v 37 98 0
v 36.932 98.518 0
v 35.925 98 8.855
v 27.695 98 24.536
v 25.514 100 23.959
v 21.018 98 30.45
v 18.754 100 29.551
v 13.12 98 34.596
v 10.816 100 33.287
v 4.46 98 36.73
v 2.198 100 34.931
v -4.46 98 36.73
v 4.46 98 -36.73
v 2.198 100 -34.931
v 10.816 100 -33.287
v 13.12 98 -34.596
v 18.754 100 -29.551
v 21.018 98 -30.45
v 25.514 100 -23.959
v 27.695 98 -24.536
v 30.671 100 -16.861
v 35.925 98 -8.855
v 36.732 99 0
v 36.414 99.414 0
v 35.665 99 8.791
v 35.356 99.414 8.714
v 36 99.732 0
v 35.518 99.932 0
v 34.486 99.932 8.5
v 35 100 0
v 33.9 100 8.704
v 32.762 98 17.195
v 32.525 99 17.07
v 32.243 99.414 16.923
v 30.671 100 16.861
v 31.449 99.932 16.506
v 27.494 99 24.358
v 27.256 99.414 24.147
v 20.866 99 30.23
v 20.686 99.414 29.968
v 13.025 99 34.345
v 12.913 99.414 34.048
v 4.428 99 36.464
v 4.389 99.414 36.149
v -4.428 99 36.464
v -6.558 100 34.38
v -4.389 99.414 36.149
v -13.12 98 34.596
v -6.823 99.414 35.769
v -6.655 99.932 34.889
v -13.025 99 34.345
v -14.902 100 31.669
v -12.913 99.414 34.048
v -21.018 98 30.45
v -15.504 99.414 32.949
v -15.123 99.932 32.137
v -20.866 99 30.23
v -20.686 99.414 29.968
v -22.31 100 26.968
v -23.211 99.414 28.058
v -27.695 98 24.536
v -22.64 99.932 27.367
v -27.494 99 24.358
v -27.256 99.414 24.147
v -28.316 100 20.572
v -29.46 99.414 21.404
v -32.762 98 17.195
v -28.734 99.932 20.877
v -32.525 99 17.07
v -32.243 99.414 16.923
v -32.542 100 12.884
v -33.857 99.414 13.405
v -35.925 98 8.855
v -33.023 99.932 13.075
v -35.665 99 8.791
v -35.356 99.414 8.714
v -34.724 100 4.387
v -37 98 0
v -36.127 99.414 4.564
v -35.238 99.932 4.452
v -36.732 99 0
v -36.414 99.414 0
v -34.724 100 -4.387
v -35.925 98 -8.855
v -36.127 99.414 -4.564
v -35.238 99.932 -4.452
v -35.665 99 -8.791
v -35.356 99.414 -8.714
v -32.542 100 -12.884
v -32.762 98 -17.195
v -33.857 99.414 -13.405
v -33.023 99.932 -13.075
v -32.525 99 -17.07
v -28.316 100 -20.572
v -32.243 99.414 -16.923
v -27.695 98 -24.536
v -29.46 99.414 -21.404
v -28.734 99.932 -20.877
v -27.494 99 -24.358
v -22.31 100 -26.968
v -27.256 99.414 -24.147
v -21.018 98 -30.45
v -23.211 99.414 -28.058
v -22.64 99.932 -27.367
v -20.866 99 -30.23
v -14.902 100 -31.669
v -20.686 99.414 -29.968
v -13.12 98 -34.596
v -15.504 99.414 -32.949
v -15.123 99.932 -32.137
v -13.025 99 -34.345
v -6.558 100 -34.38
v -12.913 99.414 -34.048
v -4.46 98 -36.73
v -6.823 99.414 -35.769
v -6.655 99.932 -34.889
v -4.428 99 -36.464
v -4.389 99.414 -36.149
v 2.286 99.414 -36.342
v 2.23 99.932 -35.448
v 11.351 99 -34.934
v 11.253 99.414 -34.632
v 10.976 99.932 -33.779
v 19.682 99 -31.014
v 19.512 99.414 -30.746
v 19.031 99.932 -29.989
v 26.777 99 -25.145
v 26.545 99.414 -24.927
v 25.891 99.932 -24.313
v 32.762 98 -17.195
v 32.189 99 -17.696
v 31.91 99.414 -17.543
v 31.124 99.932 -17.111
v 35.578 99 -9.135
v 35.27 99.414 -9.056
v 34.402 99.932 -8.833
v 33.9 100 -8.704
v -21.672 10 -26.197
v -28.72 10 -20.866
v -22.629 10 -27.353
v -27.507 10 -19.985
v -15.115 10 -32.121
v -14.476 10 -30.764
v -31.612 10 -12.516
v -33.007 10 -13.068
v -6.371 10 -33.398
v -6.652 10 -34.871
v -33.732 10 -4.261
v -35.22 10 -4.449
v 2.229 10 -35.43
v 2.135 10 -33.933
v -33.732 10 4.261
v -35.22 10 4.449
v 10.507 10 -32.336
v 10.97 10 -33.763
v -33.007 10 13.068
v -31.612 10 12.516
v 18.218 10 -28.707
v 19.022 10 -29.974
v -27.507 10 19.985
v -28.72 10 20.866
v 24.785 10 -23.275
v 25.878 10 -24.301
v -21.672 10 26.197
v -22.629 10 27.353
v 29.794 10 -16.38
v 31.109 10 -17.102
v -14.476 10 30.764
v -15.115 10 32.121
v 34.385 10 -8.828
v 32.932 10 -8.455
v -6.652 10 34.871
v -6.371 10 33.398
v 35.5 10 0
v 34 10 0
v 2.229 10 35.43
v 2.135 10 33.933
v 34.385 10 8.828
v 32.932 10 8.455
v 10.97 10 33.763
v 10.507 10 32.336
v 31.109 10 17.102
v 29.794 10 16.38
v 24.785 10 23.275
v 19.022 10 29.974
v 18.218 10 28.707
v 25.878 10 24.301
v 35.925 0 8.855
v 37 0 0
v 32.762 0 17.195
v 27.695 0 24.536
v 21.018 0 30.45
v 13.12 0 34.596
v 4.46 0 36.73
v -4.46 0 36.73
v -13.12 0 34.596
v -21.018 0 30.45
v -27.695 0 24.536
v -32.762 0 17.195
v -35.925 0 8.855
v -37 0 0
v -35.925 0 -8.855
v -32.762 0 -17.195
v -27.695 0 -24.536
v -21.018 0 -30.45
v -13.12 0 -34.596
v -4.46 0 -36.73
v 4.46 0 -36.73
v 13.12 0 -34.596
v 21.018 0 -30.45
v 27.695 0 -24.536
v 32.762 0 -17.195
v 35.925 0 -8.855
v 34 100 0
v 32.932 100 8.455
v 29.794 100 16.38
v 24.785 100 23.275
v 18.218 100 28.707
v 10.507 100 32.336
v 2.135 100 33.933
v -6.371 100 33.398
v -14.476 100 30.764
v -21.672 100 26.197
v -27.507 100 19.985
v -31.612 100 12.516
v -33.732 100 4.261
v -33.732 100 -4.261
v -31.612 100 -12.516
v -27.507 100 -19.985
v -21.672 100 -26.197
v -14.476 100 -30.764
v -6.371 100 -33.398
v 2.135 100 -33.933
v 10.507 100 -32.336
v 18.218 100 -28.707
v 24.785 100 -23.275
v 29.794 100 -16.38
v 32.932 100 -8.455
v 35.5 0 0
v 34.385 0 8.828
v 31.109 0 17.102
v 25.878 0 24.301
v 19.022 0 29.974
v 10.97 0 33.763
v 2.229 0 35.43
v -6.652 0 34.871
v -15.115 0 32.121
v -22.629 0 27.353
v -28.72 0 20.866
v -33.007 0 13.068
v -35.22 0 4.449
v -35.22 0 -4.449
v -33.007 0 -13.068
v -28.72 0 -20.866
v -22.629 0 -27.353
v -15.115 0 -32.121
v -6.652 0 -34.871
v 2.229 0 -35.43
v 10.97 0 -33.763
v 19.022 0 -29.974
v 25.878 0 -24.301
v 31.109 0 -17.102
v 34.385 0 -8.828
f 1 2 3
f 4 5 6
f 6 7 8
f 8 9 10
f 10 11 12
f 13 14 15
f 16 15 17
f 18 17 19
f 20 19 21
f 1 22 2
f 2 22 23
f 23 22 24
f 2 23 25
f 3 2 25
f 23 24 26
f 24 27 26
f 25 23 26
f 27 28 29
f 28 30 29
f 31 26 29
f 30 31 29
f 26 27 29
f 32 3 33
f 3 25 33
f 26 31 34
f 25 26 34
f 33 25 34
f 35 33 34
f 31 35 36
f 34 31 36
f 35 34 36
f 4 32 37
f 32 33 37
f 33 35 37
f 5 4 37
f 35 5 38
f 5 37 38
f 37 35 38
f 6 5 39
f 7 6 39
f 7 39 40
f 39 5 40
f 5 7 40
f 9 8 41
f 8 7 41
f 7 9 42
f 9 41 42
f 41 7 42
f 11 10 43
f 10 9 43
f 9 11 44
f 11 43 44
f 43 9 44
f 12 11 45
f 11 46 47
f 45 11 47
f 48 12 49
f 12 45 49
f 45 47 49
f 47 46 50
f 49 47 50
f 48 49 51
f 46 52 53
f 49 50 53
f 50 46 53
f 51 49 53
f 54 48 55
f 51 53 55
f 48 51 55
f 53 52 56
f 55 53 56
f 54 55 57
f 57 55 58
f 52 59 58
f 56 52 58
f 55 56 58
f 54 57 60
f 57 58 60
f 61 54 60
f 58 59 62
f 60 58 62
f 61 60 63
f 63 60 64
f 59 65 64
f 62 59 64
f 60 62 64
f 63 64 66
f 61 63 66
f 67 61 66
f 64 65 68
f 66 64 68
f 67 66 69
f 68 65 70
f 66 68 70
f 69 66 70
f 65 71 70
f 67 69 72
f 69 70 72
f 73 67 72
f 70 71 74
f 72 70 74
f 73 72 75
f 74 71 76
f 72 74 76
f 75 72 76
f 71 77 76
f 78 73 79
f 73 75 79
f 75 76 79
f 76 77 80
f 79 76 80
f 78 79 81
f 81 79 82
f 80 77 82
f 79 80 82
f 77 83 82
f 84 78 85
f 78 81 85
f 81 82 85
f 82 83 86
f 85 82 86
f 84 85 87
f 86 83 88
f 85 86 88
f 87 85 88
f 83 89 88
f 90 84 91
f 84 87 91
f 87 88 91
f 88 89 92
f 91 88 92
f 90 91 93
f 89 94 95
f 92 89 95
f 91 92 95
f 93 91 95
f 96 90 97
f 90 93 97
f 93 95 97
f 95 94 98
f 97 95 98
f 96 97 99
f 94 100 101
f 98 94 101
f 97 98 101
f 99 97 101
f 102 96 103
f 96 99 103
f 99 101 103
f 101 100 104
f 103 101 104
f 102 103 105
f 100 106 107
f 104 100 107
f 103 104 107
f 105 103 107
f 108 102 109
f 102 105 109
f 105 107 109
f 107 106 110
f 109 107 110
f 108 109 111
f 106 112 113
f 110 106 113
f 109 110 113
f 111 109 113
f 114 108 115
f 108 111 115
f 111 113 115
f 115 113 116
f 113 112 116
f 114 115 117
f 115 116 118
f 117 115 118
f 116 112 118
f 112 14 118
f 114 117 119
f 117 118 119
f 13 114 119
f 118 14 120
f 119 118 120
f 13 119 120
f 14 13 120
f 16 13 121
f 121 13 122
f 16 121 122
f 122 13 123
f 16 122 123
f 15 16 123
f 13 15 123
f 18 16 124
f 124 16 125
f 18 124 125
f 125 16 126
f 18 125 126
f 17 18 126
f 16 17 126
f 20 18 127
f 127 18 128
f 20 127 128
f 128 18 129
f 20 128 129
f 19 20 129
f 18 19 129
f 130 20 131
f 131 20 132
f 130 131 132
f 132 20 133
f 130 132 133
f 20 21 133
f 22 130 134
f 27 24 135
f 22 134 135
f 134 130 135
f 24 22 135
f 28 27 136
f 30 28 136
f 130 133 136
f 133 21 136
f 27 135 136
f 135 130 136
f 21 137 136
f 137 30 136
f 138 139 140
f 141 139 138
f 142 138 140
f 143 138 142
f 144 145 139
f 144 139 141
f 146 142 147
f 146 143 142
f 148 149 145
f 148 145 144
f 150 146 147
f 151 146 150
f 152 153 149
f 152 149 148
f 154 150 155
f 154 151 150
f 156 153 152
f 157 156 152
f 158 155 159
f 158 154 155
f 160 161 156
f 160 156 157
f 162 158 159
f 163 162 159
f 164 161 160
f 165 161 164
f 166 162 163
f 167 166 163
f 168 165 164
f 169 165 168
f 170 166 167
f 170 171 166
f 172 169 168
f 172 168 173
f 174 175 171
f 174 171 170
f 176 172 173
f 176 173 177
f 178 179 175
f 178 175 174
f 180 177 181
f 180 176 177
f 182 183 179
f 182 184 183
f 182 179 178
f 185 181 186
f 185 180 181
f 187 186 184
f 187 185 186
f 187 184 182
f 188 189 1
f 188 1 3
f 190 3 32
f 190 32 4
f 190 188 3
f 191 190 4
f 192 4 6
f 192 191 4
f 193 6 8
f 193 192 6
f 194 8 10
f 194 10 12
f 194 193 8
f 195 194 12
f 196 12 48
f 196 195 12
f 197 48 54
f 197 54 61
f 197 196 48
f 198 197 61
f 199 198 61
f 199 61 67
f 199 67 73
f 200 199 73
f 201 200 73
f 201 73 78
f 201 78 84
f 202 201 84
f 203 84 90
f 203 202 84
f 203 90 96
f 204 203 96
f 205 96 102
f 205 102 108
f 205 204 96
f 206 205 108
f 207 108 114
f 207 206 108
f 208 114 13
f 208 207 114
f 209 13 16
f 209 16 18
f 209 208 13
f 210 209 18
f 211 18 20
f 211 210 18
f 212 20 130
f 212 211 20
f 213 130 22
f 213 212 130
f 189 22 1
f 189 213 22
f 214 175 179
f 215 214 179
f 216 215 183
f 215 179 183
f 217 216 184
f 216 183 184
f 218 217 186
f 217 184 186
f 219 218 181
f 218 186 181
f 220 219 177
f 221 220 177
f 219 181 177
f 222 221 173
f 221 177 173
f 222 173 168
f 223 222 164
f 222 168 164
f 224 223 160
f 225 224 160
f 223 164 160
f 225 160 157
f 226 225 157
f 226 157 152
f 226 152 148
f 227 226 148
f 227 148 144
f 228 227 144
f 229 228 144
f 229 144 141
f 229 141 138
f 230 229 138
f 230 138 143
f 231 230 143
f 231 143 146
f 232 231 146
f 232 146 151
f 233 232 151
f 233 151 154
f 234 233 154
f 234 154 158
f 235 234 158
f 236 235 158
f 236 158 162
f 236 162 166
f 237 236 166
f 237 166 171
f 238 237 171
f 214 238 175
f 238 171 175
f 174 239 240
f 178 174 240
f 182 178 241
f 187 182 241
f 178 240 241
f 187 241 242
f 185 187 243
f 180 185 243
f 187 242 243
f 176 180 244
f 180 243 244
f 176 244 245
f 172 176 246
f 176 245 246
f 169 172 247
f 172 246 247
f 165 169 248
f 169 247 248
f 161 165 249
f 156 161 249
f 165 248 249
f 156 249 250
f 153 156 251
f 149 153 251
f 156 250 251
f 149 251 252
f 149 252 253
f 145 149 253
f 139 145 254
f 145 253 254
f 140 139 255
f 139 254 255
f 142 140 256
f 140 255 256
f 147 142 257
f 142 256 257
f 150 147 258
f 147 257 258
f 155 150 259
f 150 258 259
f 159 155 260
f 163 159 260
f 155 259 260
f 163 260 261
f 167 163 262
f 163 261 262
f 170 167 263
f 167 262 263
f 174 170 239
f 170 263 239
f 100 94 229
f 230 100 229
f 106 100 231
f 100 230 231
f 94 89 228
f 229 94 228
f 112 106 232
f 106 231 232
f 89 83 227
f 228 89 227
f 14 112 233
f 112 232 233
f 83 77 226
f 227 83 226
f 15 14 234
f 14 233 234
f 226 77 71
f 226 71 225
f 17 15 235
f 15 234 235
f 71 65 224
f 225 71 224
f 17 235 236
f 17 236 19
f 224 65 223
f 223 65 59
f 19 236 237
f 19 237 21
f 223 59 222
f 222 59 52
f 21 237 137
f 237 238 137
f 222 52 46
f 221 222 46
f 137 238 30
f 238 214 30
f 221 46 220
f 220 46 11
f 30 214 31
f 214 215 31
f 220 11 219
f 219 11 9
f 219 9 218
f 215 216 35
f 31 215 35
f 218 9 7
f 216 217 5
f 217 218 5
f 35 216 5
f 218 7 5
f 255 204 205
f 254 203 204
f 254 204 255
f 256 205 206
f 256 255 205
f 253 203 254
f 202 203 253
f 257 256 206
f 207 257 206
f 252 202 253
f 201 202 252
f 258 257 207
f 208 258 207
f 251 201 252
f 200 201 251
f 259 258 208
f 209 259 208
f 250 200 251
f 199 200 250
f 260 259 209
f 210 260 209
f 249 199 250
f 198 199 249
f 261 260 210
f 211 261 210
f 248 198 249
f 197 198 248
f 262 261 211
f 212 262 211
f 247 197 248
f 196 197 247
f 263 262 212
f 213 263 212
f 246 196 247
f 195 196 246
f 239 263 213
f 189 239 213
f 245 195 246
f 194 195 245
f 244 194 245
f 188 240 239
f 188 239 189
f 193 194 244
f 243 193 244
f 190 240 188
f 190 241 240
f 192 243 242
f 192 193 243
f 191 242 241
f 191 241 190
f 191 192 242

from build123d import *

# Parameters (mm, degrees)
F0_R     = 37
F1_DEPTH = 100
F2_R     = 34
F3_DEPTH = 245
F4_R     = 2
F5_R     = 35.5
F6_DEPTH = 10


with BuildPart() as f1:
    # F0 (on Front) → F1 (new body)
    with BuildSketch(Plane.XZ):
        Circle(F0_R)
    extrude(amount=-F1_DEPTH)

    # F2 (on face) → F3 (cut)
    with BuildSketch(Plane.XZ):
        Circle(F2_R)
    extrude(amount=-F3_DEPTH, mode=Mode.SUBTRACT)

    # F4
    f4_edges = [f1.edges().sort_by_distance(p)[0] for p in [
        (-37, 100, 0),
    ]]
    fillet(f4_edges, radius=F4_R)

    # F5 (on Front) → F6 (cut)
    with BuildSketch(Plane.XZ):
        Circle(F5_R)
    extrude(amount=-F6_DEPTH, mode=Mode.SUBTRACT)


solid = f1.part
